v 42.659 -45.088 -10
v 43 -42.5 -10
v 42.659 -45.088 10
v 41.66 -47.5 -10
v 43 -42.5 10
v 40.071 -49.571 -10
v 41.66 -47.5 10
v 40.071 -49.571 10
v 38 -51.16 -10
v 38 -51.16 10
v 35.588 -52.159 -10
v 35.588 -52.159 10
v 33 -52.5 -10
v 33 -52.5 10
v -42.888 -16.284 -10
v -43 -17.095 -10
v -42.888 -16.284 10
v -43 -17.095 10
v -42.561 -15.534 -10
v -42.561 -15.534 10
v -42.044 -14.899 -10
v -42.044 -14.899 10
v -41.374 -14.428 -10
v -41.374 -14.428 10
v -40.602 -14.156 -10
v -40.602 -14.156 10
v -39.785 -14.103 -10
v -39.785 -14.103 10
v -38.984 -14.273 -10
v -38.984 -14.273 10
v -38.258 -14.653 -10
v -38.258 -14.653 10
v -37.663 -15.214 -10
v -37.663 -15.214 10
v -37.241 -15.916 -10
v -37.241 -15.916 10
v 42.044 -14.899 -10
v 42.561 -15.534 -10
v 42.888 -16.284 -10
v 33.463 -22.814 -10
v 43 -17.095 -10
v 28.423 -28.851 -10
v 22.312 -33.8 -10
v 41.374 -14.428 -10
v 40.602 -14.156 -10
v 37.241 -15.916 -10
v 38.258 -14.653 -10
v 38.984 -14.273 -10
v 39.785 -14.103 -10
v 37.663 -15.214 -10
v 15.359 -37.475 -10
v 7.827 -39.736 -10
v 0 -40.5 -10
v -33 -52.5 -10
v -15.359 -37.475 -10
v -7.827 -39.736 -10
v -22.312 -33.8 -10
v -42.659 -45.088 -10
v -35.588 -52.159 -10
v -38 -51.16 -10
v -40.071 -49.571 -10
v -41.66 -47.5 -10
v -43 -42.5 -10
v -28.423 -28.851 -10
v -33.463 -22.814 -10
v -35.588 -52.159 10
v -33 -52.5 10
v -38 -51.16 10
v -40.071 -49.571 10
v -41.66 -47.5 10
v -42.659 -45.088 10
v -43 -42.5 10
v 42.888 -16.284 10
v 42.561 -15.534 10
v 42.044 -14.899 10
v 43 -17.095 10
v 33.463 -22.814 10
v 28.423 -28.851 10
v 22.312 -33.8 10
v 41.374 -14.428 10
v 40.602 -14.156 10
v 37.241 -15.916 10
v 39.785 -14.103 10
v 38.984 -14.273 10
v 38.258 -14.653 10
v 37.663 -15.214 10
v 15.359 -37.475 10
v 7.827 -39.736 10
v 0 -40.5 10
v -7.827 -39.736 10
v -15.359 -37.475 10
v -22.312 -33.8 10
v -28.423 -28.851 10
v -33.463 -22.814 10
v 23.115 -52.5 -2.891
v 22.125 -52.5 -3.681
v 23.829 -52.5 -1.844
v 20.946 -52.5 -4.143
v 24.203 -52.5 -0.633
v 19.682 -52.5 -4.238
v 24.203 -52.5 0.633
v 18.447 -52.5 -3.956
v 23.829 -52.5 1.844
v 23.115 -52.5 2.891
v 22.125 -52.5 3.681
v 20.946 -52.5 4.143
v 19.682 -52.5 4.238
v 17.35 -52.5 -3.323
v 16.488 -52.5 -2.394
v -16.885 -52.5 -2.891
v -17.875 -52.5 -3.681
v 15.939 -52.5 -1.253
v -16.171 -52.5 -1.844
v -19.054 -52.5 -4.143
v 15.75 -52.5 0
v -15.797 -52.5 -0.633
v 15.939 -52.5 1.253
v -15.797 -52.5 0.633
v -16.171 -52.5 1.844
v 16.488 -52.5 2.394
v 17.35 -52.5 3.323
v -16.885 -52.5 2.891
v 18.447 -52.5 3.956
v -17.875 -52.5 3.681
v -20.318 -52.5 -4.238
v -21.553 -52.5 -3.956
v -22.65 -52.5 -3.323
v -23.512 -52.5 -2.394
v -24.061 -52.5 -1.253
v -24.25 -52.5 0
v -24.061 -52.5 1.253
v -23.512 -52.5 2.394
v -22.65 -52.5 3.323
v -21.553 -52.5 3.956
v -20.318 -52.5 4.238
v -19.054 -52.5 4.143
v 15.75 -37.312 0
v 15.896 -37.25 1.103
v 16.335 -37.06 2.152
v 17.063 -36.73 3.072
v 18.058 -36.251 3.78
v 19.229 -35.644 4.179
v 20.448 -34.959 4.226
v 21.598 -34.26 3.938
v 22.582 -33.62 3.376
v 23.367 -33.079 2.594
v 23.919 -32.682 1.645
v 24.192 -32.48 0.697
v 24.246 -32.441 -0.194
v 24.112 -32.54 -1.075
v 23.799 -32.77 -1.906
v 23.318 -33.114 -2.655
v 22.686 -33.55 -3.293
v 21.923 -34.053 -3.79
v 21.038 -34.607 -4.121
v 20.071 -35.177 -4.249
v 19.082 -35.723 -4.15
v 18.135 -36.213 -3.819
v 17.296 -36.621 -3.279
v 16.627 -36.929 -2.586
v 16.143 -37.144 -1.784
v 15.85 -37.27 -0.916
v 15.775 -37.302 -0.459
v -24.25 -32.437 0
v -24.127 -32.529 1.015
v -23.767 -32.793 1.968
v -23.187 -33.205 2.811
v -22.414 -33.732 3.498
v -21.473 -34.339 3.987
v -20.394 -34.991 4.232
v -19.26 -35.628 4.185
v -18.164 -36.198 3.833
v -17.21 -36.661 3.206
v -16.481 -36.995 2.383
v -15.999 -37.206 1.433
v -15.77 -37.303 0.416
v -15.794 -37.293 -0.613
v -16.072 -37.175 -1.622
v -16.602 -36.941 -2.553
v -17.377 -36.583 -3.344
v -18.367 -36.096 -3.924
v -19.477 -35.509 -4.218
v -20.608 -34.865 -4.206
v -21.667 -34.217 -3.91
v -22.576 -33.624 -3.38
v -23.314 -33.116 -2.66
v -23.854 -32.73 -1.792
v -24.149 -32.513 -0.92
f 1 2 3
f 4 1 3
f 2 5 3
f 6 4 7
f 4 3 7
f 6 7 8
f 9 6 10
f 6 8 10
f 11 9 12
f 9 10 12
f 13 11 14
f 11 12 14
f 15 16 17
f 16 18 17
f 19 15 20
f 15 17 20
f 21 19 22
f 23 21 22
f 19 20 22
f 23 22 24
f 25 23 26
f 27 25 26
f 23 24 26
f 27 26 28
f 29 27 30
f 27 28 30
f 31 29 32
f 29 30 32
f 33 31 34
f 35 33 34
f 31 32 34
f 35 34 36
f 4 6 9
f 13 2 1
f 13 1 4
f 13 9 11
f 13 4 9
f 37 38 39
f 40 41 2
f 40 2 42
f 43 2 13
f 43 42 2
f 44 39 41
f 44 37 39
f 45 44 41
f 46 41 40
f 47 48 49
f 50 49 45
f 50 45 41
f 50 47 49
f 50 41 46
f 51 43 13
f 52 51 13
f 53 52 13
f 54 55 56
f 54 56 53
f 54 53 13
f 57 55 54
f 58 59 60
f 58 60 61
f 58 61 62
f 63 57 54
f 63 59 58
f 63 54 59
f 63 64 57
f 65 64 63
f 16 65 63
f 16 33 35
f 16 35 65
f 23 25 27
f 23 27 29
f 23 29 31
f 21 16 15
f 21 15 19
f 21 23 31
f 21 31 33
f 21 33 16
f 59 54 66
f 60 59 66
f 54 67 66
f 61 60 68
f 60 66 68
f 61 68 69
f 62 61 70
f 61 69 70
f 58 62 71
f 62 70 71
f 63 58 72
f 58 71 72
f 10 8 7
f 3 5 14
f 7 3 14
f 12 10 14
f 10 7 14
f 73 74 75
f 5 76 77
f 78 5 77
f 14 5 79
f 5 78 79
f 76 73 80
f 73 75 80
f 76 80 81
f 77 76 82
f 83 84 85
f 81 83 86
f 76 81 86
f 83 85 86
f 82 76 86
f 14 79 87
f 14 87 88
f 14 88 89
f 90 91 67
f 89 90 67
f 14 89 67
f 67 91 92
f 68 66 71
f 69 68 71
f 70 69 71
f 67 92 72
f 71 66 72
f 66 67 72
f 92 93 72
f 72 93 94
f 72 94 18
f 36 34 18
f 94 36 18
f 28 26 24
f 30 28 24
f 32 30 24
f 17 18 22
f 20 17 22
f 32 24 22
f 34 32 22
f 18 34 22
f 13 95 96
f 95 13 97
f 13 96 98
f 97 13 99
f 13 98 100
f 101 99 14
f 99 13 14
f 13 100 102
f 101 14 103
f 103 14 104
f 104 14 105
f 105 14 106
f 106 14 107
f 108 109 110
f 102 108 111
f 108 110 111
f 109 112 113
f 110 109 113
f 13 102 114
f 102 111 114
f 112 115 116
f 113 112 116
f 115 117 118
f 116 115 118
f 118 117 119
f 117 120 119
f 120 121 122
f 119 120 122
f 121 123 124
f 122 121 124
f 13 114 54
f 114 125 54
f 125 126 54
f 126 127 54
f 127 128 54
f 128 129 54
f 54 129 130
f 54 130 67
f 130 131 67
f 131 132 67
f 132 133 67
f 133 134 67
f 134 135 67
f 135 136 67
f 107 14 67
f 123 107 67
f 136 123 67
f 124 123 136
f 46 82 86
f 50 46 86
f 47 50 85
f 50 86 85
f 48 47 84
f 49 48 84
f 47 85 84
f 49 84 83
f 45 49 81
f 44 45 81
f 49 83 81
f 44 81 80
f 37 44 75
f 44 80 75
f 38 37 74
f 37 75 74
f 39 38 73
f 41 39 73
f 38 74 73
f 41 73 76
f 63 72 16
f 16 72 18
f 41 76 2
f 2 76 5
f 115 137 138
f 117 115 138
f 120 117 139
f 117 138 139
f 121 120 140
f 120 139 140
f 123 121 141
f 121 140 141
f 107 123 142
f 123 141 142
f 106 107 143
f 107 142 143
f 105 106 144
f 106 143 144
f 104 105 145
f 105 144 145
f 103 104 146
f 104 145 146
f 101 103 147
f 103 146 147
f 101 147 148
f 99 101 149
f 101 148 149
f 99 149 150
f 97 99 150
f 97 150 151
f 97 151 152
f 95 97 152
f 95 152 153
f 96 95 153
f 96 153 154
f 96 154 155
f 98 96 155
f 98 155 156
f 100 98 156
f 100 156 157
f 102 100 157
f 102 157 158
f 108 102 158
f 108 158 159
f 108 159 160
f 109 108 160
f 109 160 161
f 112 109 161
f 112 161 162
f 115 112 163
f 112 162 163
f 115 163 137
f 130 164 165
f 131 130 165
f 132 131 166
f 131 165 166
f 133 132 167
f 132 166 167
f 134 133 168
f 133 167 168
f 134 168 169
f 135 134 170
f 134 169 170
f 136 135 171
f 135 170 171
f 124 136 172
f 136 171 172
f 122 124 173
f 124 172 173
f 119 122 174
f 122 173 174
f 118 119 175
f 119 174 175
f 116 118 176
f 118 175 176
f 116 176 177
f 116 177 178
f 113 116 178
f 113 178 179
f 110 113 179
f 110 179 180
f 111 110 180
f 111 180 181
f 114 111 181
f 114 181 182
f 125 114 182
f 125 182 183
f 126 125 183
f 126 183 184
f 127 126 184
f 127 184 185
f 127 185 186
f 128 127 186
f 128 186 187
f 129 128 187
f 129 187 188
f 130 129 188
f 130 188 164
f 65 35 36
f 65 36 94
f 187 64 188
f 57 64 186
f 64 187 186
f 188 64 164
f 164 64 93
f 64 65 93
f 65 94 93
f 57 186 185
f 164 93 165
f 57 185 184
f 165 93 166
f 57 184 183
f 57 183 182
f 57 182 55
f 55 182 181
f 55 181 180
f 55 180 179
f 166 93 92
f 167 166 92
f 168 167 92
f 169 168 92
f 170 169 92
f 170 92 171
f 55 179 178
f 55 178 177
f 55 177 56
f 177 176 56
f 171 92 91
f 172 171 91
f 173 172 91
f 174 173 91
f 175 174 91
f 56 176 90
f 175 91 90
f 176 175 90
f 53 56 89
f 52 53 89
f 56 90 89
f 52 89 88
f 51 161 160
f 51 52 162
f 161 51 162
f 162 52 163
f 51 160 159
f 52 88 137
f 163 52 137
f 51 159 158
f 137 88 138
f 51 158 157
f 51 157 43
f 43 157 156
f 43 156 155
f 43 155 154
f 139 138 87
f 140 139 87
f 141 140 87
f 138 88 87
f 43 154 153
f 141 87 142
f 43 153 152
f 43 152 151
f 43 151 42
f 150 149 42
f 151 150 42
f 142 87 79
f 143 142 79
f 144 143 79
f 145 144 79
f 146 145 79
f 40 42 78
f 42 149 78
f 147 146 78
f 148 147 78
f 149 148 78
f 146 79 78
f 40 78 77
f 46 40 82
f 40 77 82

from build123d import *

# Parameters (mm, degrees)
BASE_EXTRUDE_DEPTH = 10
HOLE1_D            = 8.5
HOLE1_DEPTH        = 30
HOLE1_TIP          = 2.553657631


with BuildPart() as part:
    # Sketch1 → Base-Extrude (new body, symmetric)
    with BuildSketch(Plane.XY):
        with BuildLine():
            Line((43, -17.095320997), (43, -42.5))
            ThreePointArc((43, -42.5), (40.071067812, -49.571067812), (33, -52.5))
            Line((33, -52.5), (-33, -52.5))
            ThreePointArc((-33, -52.5), (-40.071067812, -49.571067812), (-43, -42.5))
            Line((-43, -42.5), (-43, -17.095320997))
            ThreePointArc((-43, -17.095320997), (-40.601721668, -14.156285265), (-37.24137931, -15.916333342))
            ThreePointArc((-37.24137931, -15.916333342), (0, -40.5), (37.24137931, -15.916333342))
            ThreePointArc((37.24137931, -15.916333342), (40.601721668, -14.156285265), (43, -17.095320997))
        make_face()
    extrude(amount=BASE_EXTRUDE_DEPTH, both=True)

    # Hole1
    with Locations(Plane.XZ.offset(52.5)):
        with Locations((-20, 0), (20, 0)):
            Hole(HOLE1_D / 2, depth=HOLE1_DEPTH)
            with Locations((0, 0, -(HOLE1_DEPTH + HOLE1_TIP / 2))):  # 118° drill point
                Cone(0, HOLE1_D / 2, HOLE1_TIP, mode=Mode.SUBTRACT)


solid = part.part
